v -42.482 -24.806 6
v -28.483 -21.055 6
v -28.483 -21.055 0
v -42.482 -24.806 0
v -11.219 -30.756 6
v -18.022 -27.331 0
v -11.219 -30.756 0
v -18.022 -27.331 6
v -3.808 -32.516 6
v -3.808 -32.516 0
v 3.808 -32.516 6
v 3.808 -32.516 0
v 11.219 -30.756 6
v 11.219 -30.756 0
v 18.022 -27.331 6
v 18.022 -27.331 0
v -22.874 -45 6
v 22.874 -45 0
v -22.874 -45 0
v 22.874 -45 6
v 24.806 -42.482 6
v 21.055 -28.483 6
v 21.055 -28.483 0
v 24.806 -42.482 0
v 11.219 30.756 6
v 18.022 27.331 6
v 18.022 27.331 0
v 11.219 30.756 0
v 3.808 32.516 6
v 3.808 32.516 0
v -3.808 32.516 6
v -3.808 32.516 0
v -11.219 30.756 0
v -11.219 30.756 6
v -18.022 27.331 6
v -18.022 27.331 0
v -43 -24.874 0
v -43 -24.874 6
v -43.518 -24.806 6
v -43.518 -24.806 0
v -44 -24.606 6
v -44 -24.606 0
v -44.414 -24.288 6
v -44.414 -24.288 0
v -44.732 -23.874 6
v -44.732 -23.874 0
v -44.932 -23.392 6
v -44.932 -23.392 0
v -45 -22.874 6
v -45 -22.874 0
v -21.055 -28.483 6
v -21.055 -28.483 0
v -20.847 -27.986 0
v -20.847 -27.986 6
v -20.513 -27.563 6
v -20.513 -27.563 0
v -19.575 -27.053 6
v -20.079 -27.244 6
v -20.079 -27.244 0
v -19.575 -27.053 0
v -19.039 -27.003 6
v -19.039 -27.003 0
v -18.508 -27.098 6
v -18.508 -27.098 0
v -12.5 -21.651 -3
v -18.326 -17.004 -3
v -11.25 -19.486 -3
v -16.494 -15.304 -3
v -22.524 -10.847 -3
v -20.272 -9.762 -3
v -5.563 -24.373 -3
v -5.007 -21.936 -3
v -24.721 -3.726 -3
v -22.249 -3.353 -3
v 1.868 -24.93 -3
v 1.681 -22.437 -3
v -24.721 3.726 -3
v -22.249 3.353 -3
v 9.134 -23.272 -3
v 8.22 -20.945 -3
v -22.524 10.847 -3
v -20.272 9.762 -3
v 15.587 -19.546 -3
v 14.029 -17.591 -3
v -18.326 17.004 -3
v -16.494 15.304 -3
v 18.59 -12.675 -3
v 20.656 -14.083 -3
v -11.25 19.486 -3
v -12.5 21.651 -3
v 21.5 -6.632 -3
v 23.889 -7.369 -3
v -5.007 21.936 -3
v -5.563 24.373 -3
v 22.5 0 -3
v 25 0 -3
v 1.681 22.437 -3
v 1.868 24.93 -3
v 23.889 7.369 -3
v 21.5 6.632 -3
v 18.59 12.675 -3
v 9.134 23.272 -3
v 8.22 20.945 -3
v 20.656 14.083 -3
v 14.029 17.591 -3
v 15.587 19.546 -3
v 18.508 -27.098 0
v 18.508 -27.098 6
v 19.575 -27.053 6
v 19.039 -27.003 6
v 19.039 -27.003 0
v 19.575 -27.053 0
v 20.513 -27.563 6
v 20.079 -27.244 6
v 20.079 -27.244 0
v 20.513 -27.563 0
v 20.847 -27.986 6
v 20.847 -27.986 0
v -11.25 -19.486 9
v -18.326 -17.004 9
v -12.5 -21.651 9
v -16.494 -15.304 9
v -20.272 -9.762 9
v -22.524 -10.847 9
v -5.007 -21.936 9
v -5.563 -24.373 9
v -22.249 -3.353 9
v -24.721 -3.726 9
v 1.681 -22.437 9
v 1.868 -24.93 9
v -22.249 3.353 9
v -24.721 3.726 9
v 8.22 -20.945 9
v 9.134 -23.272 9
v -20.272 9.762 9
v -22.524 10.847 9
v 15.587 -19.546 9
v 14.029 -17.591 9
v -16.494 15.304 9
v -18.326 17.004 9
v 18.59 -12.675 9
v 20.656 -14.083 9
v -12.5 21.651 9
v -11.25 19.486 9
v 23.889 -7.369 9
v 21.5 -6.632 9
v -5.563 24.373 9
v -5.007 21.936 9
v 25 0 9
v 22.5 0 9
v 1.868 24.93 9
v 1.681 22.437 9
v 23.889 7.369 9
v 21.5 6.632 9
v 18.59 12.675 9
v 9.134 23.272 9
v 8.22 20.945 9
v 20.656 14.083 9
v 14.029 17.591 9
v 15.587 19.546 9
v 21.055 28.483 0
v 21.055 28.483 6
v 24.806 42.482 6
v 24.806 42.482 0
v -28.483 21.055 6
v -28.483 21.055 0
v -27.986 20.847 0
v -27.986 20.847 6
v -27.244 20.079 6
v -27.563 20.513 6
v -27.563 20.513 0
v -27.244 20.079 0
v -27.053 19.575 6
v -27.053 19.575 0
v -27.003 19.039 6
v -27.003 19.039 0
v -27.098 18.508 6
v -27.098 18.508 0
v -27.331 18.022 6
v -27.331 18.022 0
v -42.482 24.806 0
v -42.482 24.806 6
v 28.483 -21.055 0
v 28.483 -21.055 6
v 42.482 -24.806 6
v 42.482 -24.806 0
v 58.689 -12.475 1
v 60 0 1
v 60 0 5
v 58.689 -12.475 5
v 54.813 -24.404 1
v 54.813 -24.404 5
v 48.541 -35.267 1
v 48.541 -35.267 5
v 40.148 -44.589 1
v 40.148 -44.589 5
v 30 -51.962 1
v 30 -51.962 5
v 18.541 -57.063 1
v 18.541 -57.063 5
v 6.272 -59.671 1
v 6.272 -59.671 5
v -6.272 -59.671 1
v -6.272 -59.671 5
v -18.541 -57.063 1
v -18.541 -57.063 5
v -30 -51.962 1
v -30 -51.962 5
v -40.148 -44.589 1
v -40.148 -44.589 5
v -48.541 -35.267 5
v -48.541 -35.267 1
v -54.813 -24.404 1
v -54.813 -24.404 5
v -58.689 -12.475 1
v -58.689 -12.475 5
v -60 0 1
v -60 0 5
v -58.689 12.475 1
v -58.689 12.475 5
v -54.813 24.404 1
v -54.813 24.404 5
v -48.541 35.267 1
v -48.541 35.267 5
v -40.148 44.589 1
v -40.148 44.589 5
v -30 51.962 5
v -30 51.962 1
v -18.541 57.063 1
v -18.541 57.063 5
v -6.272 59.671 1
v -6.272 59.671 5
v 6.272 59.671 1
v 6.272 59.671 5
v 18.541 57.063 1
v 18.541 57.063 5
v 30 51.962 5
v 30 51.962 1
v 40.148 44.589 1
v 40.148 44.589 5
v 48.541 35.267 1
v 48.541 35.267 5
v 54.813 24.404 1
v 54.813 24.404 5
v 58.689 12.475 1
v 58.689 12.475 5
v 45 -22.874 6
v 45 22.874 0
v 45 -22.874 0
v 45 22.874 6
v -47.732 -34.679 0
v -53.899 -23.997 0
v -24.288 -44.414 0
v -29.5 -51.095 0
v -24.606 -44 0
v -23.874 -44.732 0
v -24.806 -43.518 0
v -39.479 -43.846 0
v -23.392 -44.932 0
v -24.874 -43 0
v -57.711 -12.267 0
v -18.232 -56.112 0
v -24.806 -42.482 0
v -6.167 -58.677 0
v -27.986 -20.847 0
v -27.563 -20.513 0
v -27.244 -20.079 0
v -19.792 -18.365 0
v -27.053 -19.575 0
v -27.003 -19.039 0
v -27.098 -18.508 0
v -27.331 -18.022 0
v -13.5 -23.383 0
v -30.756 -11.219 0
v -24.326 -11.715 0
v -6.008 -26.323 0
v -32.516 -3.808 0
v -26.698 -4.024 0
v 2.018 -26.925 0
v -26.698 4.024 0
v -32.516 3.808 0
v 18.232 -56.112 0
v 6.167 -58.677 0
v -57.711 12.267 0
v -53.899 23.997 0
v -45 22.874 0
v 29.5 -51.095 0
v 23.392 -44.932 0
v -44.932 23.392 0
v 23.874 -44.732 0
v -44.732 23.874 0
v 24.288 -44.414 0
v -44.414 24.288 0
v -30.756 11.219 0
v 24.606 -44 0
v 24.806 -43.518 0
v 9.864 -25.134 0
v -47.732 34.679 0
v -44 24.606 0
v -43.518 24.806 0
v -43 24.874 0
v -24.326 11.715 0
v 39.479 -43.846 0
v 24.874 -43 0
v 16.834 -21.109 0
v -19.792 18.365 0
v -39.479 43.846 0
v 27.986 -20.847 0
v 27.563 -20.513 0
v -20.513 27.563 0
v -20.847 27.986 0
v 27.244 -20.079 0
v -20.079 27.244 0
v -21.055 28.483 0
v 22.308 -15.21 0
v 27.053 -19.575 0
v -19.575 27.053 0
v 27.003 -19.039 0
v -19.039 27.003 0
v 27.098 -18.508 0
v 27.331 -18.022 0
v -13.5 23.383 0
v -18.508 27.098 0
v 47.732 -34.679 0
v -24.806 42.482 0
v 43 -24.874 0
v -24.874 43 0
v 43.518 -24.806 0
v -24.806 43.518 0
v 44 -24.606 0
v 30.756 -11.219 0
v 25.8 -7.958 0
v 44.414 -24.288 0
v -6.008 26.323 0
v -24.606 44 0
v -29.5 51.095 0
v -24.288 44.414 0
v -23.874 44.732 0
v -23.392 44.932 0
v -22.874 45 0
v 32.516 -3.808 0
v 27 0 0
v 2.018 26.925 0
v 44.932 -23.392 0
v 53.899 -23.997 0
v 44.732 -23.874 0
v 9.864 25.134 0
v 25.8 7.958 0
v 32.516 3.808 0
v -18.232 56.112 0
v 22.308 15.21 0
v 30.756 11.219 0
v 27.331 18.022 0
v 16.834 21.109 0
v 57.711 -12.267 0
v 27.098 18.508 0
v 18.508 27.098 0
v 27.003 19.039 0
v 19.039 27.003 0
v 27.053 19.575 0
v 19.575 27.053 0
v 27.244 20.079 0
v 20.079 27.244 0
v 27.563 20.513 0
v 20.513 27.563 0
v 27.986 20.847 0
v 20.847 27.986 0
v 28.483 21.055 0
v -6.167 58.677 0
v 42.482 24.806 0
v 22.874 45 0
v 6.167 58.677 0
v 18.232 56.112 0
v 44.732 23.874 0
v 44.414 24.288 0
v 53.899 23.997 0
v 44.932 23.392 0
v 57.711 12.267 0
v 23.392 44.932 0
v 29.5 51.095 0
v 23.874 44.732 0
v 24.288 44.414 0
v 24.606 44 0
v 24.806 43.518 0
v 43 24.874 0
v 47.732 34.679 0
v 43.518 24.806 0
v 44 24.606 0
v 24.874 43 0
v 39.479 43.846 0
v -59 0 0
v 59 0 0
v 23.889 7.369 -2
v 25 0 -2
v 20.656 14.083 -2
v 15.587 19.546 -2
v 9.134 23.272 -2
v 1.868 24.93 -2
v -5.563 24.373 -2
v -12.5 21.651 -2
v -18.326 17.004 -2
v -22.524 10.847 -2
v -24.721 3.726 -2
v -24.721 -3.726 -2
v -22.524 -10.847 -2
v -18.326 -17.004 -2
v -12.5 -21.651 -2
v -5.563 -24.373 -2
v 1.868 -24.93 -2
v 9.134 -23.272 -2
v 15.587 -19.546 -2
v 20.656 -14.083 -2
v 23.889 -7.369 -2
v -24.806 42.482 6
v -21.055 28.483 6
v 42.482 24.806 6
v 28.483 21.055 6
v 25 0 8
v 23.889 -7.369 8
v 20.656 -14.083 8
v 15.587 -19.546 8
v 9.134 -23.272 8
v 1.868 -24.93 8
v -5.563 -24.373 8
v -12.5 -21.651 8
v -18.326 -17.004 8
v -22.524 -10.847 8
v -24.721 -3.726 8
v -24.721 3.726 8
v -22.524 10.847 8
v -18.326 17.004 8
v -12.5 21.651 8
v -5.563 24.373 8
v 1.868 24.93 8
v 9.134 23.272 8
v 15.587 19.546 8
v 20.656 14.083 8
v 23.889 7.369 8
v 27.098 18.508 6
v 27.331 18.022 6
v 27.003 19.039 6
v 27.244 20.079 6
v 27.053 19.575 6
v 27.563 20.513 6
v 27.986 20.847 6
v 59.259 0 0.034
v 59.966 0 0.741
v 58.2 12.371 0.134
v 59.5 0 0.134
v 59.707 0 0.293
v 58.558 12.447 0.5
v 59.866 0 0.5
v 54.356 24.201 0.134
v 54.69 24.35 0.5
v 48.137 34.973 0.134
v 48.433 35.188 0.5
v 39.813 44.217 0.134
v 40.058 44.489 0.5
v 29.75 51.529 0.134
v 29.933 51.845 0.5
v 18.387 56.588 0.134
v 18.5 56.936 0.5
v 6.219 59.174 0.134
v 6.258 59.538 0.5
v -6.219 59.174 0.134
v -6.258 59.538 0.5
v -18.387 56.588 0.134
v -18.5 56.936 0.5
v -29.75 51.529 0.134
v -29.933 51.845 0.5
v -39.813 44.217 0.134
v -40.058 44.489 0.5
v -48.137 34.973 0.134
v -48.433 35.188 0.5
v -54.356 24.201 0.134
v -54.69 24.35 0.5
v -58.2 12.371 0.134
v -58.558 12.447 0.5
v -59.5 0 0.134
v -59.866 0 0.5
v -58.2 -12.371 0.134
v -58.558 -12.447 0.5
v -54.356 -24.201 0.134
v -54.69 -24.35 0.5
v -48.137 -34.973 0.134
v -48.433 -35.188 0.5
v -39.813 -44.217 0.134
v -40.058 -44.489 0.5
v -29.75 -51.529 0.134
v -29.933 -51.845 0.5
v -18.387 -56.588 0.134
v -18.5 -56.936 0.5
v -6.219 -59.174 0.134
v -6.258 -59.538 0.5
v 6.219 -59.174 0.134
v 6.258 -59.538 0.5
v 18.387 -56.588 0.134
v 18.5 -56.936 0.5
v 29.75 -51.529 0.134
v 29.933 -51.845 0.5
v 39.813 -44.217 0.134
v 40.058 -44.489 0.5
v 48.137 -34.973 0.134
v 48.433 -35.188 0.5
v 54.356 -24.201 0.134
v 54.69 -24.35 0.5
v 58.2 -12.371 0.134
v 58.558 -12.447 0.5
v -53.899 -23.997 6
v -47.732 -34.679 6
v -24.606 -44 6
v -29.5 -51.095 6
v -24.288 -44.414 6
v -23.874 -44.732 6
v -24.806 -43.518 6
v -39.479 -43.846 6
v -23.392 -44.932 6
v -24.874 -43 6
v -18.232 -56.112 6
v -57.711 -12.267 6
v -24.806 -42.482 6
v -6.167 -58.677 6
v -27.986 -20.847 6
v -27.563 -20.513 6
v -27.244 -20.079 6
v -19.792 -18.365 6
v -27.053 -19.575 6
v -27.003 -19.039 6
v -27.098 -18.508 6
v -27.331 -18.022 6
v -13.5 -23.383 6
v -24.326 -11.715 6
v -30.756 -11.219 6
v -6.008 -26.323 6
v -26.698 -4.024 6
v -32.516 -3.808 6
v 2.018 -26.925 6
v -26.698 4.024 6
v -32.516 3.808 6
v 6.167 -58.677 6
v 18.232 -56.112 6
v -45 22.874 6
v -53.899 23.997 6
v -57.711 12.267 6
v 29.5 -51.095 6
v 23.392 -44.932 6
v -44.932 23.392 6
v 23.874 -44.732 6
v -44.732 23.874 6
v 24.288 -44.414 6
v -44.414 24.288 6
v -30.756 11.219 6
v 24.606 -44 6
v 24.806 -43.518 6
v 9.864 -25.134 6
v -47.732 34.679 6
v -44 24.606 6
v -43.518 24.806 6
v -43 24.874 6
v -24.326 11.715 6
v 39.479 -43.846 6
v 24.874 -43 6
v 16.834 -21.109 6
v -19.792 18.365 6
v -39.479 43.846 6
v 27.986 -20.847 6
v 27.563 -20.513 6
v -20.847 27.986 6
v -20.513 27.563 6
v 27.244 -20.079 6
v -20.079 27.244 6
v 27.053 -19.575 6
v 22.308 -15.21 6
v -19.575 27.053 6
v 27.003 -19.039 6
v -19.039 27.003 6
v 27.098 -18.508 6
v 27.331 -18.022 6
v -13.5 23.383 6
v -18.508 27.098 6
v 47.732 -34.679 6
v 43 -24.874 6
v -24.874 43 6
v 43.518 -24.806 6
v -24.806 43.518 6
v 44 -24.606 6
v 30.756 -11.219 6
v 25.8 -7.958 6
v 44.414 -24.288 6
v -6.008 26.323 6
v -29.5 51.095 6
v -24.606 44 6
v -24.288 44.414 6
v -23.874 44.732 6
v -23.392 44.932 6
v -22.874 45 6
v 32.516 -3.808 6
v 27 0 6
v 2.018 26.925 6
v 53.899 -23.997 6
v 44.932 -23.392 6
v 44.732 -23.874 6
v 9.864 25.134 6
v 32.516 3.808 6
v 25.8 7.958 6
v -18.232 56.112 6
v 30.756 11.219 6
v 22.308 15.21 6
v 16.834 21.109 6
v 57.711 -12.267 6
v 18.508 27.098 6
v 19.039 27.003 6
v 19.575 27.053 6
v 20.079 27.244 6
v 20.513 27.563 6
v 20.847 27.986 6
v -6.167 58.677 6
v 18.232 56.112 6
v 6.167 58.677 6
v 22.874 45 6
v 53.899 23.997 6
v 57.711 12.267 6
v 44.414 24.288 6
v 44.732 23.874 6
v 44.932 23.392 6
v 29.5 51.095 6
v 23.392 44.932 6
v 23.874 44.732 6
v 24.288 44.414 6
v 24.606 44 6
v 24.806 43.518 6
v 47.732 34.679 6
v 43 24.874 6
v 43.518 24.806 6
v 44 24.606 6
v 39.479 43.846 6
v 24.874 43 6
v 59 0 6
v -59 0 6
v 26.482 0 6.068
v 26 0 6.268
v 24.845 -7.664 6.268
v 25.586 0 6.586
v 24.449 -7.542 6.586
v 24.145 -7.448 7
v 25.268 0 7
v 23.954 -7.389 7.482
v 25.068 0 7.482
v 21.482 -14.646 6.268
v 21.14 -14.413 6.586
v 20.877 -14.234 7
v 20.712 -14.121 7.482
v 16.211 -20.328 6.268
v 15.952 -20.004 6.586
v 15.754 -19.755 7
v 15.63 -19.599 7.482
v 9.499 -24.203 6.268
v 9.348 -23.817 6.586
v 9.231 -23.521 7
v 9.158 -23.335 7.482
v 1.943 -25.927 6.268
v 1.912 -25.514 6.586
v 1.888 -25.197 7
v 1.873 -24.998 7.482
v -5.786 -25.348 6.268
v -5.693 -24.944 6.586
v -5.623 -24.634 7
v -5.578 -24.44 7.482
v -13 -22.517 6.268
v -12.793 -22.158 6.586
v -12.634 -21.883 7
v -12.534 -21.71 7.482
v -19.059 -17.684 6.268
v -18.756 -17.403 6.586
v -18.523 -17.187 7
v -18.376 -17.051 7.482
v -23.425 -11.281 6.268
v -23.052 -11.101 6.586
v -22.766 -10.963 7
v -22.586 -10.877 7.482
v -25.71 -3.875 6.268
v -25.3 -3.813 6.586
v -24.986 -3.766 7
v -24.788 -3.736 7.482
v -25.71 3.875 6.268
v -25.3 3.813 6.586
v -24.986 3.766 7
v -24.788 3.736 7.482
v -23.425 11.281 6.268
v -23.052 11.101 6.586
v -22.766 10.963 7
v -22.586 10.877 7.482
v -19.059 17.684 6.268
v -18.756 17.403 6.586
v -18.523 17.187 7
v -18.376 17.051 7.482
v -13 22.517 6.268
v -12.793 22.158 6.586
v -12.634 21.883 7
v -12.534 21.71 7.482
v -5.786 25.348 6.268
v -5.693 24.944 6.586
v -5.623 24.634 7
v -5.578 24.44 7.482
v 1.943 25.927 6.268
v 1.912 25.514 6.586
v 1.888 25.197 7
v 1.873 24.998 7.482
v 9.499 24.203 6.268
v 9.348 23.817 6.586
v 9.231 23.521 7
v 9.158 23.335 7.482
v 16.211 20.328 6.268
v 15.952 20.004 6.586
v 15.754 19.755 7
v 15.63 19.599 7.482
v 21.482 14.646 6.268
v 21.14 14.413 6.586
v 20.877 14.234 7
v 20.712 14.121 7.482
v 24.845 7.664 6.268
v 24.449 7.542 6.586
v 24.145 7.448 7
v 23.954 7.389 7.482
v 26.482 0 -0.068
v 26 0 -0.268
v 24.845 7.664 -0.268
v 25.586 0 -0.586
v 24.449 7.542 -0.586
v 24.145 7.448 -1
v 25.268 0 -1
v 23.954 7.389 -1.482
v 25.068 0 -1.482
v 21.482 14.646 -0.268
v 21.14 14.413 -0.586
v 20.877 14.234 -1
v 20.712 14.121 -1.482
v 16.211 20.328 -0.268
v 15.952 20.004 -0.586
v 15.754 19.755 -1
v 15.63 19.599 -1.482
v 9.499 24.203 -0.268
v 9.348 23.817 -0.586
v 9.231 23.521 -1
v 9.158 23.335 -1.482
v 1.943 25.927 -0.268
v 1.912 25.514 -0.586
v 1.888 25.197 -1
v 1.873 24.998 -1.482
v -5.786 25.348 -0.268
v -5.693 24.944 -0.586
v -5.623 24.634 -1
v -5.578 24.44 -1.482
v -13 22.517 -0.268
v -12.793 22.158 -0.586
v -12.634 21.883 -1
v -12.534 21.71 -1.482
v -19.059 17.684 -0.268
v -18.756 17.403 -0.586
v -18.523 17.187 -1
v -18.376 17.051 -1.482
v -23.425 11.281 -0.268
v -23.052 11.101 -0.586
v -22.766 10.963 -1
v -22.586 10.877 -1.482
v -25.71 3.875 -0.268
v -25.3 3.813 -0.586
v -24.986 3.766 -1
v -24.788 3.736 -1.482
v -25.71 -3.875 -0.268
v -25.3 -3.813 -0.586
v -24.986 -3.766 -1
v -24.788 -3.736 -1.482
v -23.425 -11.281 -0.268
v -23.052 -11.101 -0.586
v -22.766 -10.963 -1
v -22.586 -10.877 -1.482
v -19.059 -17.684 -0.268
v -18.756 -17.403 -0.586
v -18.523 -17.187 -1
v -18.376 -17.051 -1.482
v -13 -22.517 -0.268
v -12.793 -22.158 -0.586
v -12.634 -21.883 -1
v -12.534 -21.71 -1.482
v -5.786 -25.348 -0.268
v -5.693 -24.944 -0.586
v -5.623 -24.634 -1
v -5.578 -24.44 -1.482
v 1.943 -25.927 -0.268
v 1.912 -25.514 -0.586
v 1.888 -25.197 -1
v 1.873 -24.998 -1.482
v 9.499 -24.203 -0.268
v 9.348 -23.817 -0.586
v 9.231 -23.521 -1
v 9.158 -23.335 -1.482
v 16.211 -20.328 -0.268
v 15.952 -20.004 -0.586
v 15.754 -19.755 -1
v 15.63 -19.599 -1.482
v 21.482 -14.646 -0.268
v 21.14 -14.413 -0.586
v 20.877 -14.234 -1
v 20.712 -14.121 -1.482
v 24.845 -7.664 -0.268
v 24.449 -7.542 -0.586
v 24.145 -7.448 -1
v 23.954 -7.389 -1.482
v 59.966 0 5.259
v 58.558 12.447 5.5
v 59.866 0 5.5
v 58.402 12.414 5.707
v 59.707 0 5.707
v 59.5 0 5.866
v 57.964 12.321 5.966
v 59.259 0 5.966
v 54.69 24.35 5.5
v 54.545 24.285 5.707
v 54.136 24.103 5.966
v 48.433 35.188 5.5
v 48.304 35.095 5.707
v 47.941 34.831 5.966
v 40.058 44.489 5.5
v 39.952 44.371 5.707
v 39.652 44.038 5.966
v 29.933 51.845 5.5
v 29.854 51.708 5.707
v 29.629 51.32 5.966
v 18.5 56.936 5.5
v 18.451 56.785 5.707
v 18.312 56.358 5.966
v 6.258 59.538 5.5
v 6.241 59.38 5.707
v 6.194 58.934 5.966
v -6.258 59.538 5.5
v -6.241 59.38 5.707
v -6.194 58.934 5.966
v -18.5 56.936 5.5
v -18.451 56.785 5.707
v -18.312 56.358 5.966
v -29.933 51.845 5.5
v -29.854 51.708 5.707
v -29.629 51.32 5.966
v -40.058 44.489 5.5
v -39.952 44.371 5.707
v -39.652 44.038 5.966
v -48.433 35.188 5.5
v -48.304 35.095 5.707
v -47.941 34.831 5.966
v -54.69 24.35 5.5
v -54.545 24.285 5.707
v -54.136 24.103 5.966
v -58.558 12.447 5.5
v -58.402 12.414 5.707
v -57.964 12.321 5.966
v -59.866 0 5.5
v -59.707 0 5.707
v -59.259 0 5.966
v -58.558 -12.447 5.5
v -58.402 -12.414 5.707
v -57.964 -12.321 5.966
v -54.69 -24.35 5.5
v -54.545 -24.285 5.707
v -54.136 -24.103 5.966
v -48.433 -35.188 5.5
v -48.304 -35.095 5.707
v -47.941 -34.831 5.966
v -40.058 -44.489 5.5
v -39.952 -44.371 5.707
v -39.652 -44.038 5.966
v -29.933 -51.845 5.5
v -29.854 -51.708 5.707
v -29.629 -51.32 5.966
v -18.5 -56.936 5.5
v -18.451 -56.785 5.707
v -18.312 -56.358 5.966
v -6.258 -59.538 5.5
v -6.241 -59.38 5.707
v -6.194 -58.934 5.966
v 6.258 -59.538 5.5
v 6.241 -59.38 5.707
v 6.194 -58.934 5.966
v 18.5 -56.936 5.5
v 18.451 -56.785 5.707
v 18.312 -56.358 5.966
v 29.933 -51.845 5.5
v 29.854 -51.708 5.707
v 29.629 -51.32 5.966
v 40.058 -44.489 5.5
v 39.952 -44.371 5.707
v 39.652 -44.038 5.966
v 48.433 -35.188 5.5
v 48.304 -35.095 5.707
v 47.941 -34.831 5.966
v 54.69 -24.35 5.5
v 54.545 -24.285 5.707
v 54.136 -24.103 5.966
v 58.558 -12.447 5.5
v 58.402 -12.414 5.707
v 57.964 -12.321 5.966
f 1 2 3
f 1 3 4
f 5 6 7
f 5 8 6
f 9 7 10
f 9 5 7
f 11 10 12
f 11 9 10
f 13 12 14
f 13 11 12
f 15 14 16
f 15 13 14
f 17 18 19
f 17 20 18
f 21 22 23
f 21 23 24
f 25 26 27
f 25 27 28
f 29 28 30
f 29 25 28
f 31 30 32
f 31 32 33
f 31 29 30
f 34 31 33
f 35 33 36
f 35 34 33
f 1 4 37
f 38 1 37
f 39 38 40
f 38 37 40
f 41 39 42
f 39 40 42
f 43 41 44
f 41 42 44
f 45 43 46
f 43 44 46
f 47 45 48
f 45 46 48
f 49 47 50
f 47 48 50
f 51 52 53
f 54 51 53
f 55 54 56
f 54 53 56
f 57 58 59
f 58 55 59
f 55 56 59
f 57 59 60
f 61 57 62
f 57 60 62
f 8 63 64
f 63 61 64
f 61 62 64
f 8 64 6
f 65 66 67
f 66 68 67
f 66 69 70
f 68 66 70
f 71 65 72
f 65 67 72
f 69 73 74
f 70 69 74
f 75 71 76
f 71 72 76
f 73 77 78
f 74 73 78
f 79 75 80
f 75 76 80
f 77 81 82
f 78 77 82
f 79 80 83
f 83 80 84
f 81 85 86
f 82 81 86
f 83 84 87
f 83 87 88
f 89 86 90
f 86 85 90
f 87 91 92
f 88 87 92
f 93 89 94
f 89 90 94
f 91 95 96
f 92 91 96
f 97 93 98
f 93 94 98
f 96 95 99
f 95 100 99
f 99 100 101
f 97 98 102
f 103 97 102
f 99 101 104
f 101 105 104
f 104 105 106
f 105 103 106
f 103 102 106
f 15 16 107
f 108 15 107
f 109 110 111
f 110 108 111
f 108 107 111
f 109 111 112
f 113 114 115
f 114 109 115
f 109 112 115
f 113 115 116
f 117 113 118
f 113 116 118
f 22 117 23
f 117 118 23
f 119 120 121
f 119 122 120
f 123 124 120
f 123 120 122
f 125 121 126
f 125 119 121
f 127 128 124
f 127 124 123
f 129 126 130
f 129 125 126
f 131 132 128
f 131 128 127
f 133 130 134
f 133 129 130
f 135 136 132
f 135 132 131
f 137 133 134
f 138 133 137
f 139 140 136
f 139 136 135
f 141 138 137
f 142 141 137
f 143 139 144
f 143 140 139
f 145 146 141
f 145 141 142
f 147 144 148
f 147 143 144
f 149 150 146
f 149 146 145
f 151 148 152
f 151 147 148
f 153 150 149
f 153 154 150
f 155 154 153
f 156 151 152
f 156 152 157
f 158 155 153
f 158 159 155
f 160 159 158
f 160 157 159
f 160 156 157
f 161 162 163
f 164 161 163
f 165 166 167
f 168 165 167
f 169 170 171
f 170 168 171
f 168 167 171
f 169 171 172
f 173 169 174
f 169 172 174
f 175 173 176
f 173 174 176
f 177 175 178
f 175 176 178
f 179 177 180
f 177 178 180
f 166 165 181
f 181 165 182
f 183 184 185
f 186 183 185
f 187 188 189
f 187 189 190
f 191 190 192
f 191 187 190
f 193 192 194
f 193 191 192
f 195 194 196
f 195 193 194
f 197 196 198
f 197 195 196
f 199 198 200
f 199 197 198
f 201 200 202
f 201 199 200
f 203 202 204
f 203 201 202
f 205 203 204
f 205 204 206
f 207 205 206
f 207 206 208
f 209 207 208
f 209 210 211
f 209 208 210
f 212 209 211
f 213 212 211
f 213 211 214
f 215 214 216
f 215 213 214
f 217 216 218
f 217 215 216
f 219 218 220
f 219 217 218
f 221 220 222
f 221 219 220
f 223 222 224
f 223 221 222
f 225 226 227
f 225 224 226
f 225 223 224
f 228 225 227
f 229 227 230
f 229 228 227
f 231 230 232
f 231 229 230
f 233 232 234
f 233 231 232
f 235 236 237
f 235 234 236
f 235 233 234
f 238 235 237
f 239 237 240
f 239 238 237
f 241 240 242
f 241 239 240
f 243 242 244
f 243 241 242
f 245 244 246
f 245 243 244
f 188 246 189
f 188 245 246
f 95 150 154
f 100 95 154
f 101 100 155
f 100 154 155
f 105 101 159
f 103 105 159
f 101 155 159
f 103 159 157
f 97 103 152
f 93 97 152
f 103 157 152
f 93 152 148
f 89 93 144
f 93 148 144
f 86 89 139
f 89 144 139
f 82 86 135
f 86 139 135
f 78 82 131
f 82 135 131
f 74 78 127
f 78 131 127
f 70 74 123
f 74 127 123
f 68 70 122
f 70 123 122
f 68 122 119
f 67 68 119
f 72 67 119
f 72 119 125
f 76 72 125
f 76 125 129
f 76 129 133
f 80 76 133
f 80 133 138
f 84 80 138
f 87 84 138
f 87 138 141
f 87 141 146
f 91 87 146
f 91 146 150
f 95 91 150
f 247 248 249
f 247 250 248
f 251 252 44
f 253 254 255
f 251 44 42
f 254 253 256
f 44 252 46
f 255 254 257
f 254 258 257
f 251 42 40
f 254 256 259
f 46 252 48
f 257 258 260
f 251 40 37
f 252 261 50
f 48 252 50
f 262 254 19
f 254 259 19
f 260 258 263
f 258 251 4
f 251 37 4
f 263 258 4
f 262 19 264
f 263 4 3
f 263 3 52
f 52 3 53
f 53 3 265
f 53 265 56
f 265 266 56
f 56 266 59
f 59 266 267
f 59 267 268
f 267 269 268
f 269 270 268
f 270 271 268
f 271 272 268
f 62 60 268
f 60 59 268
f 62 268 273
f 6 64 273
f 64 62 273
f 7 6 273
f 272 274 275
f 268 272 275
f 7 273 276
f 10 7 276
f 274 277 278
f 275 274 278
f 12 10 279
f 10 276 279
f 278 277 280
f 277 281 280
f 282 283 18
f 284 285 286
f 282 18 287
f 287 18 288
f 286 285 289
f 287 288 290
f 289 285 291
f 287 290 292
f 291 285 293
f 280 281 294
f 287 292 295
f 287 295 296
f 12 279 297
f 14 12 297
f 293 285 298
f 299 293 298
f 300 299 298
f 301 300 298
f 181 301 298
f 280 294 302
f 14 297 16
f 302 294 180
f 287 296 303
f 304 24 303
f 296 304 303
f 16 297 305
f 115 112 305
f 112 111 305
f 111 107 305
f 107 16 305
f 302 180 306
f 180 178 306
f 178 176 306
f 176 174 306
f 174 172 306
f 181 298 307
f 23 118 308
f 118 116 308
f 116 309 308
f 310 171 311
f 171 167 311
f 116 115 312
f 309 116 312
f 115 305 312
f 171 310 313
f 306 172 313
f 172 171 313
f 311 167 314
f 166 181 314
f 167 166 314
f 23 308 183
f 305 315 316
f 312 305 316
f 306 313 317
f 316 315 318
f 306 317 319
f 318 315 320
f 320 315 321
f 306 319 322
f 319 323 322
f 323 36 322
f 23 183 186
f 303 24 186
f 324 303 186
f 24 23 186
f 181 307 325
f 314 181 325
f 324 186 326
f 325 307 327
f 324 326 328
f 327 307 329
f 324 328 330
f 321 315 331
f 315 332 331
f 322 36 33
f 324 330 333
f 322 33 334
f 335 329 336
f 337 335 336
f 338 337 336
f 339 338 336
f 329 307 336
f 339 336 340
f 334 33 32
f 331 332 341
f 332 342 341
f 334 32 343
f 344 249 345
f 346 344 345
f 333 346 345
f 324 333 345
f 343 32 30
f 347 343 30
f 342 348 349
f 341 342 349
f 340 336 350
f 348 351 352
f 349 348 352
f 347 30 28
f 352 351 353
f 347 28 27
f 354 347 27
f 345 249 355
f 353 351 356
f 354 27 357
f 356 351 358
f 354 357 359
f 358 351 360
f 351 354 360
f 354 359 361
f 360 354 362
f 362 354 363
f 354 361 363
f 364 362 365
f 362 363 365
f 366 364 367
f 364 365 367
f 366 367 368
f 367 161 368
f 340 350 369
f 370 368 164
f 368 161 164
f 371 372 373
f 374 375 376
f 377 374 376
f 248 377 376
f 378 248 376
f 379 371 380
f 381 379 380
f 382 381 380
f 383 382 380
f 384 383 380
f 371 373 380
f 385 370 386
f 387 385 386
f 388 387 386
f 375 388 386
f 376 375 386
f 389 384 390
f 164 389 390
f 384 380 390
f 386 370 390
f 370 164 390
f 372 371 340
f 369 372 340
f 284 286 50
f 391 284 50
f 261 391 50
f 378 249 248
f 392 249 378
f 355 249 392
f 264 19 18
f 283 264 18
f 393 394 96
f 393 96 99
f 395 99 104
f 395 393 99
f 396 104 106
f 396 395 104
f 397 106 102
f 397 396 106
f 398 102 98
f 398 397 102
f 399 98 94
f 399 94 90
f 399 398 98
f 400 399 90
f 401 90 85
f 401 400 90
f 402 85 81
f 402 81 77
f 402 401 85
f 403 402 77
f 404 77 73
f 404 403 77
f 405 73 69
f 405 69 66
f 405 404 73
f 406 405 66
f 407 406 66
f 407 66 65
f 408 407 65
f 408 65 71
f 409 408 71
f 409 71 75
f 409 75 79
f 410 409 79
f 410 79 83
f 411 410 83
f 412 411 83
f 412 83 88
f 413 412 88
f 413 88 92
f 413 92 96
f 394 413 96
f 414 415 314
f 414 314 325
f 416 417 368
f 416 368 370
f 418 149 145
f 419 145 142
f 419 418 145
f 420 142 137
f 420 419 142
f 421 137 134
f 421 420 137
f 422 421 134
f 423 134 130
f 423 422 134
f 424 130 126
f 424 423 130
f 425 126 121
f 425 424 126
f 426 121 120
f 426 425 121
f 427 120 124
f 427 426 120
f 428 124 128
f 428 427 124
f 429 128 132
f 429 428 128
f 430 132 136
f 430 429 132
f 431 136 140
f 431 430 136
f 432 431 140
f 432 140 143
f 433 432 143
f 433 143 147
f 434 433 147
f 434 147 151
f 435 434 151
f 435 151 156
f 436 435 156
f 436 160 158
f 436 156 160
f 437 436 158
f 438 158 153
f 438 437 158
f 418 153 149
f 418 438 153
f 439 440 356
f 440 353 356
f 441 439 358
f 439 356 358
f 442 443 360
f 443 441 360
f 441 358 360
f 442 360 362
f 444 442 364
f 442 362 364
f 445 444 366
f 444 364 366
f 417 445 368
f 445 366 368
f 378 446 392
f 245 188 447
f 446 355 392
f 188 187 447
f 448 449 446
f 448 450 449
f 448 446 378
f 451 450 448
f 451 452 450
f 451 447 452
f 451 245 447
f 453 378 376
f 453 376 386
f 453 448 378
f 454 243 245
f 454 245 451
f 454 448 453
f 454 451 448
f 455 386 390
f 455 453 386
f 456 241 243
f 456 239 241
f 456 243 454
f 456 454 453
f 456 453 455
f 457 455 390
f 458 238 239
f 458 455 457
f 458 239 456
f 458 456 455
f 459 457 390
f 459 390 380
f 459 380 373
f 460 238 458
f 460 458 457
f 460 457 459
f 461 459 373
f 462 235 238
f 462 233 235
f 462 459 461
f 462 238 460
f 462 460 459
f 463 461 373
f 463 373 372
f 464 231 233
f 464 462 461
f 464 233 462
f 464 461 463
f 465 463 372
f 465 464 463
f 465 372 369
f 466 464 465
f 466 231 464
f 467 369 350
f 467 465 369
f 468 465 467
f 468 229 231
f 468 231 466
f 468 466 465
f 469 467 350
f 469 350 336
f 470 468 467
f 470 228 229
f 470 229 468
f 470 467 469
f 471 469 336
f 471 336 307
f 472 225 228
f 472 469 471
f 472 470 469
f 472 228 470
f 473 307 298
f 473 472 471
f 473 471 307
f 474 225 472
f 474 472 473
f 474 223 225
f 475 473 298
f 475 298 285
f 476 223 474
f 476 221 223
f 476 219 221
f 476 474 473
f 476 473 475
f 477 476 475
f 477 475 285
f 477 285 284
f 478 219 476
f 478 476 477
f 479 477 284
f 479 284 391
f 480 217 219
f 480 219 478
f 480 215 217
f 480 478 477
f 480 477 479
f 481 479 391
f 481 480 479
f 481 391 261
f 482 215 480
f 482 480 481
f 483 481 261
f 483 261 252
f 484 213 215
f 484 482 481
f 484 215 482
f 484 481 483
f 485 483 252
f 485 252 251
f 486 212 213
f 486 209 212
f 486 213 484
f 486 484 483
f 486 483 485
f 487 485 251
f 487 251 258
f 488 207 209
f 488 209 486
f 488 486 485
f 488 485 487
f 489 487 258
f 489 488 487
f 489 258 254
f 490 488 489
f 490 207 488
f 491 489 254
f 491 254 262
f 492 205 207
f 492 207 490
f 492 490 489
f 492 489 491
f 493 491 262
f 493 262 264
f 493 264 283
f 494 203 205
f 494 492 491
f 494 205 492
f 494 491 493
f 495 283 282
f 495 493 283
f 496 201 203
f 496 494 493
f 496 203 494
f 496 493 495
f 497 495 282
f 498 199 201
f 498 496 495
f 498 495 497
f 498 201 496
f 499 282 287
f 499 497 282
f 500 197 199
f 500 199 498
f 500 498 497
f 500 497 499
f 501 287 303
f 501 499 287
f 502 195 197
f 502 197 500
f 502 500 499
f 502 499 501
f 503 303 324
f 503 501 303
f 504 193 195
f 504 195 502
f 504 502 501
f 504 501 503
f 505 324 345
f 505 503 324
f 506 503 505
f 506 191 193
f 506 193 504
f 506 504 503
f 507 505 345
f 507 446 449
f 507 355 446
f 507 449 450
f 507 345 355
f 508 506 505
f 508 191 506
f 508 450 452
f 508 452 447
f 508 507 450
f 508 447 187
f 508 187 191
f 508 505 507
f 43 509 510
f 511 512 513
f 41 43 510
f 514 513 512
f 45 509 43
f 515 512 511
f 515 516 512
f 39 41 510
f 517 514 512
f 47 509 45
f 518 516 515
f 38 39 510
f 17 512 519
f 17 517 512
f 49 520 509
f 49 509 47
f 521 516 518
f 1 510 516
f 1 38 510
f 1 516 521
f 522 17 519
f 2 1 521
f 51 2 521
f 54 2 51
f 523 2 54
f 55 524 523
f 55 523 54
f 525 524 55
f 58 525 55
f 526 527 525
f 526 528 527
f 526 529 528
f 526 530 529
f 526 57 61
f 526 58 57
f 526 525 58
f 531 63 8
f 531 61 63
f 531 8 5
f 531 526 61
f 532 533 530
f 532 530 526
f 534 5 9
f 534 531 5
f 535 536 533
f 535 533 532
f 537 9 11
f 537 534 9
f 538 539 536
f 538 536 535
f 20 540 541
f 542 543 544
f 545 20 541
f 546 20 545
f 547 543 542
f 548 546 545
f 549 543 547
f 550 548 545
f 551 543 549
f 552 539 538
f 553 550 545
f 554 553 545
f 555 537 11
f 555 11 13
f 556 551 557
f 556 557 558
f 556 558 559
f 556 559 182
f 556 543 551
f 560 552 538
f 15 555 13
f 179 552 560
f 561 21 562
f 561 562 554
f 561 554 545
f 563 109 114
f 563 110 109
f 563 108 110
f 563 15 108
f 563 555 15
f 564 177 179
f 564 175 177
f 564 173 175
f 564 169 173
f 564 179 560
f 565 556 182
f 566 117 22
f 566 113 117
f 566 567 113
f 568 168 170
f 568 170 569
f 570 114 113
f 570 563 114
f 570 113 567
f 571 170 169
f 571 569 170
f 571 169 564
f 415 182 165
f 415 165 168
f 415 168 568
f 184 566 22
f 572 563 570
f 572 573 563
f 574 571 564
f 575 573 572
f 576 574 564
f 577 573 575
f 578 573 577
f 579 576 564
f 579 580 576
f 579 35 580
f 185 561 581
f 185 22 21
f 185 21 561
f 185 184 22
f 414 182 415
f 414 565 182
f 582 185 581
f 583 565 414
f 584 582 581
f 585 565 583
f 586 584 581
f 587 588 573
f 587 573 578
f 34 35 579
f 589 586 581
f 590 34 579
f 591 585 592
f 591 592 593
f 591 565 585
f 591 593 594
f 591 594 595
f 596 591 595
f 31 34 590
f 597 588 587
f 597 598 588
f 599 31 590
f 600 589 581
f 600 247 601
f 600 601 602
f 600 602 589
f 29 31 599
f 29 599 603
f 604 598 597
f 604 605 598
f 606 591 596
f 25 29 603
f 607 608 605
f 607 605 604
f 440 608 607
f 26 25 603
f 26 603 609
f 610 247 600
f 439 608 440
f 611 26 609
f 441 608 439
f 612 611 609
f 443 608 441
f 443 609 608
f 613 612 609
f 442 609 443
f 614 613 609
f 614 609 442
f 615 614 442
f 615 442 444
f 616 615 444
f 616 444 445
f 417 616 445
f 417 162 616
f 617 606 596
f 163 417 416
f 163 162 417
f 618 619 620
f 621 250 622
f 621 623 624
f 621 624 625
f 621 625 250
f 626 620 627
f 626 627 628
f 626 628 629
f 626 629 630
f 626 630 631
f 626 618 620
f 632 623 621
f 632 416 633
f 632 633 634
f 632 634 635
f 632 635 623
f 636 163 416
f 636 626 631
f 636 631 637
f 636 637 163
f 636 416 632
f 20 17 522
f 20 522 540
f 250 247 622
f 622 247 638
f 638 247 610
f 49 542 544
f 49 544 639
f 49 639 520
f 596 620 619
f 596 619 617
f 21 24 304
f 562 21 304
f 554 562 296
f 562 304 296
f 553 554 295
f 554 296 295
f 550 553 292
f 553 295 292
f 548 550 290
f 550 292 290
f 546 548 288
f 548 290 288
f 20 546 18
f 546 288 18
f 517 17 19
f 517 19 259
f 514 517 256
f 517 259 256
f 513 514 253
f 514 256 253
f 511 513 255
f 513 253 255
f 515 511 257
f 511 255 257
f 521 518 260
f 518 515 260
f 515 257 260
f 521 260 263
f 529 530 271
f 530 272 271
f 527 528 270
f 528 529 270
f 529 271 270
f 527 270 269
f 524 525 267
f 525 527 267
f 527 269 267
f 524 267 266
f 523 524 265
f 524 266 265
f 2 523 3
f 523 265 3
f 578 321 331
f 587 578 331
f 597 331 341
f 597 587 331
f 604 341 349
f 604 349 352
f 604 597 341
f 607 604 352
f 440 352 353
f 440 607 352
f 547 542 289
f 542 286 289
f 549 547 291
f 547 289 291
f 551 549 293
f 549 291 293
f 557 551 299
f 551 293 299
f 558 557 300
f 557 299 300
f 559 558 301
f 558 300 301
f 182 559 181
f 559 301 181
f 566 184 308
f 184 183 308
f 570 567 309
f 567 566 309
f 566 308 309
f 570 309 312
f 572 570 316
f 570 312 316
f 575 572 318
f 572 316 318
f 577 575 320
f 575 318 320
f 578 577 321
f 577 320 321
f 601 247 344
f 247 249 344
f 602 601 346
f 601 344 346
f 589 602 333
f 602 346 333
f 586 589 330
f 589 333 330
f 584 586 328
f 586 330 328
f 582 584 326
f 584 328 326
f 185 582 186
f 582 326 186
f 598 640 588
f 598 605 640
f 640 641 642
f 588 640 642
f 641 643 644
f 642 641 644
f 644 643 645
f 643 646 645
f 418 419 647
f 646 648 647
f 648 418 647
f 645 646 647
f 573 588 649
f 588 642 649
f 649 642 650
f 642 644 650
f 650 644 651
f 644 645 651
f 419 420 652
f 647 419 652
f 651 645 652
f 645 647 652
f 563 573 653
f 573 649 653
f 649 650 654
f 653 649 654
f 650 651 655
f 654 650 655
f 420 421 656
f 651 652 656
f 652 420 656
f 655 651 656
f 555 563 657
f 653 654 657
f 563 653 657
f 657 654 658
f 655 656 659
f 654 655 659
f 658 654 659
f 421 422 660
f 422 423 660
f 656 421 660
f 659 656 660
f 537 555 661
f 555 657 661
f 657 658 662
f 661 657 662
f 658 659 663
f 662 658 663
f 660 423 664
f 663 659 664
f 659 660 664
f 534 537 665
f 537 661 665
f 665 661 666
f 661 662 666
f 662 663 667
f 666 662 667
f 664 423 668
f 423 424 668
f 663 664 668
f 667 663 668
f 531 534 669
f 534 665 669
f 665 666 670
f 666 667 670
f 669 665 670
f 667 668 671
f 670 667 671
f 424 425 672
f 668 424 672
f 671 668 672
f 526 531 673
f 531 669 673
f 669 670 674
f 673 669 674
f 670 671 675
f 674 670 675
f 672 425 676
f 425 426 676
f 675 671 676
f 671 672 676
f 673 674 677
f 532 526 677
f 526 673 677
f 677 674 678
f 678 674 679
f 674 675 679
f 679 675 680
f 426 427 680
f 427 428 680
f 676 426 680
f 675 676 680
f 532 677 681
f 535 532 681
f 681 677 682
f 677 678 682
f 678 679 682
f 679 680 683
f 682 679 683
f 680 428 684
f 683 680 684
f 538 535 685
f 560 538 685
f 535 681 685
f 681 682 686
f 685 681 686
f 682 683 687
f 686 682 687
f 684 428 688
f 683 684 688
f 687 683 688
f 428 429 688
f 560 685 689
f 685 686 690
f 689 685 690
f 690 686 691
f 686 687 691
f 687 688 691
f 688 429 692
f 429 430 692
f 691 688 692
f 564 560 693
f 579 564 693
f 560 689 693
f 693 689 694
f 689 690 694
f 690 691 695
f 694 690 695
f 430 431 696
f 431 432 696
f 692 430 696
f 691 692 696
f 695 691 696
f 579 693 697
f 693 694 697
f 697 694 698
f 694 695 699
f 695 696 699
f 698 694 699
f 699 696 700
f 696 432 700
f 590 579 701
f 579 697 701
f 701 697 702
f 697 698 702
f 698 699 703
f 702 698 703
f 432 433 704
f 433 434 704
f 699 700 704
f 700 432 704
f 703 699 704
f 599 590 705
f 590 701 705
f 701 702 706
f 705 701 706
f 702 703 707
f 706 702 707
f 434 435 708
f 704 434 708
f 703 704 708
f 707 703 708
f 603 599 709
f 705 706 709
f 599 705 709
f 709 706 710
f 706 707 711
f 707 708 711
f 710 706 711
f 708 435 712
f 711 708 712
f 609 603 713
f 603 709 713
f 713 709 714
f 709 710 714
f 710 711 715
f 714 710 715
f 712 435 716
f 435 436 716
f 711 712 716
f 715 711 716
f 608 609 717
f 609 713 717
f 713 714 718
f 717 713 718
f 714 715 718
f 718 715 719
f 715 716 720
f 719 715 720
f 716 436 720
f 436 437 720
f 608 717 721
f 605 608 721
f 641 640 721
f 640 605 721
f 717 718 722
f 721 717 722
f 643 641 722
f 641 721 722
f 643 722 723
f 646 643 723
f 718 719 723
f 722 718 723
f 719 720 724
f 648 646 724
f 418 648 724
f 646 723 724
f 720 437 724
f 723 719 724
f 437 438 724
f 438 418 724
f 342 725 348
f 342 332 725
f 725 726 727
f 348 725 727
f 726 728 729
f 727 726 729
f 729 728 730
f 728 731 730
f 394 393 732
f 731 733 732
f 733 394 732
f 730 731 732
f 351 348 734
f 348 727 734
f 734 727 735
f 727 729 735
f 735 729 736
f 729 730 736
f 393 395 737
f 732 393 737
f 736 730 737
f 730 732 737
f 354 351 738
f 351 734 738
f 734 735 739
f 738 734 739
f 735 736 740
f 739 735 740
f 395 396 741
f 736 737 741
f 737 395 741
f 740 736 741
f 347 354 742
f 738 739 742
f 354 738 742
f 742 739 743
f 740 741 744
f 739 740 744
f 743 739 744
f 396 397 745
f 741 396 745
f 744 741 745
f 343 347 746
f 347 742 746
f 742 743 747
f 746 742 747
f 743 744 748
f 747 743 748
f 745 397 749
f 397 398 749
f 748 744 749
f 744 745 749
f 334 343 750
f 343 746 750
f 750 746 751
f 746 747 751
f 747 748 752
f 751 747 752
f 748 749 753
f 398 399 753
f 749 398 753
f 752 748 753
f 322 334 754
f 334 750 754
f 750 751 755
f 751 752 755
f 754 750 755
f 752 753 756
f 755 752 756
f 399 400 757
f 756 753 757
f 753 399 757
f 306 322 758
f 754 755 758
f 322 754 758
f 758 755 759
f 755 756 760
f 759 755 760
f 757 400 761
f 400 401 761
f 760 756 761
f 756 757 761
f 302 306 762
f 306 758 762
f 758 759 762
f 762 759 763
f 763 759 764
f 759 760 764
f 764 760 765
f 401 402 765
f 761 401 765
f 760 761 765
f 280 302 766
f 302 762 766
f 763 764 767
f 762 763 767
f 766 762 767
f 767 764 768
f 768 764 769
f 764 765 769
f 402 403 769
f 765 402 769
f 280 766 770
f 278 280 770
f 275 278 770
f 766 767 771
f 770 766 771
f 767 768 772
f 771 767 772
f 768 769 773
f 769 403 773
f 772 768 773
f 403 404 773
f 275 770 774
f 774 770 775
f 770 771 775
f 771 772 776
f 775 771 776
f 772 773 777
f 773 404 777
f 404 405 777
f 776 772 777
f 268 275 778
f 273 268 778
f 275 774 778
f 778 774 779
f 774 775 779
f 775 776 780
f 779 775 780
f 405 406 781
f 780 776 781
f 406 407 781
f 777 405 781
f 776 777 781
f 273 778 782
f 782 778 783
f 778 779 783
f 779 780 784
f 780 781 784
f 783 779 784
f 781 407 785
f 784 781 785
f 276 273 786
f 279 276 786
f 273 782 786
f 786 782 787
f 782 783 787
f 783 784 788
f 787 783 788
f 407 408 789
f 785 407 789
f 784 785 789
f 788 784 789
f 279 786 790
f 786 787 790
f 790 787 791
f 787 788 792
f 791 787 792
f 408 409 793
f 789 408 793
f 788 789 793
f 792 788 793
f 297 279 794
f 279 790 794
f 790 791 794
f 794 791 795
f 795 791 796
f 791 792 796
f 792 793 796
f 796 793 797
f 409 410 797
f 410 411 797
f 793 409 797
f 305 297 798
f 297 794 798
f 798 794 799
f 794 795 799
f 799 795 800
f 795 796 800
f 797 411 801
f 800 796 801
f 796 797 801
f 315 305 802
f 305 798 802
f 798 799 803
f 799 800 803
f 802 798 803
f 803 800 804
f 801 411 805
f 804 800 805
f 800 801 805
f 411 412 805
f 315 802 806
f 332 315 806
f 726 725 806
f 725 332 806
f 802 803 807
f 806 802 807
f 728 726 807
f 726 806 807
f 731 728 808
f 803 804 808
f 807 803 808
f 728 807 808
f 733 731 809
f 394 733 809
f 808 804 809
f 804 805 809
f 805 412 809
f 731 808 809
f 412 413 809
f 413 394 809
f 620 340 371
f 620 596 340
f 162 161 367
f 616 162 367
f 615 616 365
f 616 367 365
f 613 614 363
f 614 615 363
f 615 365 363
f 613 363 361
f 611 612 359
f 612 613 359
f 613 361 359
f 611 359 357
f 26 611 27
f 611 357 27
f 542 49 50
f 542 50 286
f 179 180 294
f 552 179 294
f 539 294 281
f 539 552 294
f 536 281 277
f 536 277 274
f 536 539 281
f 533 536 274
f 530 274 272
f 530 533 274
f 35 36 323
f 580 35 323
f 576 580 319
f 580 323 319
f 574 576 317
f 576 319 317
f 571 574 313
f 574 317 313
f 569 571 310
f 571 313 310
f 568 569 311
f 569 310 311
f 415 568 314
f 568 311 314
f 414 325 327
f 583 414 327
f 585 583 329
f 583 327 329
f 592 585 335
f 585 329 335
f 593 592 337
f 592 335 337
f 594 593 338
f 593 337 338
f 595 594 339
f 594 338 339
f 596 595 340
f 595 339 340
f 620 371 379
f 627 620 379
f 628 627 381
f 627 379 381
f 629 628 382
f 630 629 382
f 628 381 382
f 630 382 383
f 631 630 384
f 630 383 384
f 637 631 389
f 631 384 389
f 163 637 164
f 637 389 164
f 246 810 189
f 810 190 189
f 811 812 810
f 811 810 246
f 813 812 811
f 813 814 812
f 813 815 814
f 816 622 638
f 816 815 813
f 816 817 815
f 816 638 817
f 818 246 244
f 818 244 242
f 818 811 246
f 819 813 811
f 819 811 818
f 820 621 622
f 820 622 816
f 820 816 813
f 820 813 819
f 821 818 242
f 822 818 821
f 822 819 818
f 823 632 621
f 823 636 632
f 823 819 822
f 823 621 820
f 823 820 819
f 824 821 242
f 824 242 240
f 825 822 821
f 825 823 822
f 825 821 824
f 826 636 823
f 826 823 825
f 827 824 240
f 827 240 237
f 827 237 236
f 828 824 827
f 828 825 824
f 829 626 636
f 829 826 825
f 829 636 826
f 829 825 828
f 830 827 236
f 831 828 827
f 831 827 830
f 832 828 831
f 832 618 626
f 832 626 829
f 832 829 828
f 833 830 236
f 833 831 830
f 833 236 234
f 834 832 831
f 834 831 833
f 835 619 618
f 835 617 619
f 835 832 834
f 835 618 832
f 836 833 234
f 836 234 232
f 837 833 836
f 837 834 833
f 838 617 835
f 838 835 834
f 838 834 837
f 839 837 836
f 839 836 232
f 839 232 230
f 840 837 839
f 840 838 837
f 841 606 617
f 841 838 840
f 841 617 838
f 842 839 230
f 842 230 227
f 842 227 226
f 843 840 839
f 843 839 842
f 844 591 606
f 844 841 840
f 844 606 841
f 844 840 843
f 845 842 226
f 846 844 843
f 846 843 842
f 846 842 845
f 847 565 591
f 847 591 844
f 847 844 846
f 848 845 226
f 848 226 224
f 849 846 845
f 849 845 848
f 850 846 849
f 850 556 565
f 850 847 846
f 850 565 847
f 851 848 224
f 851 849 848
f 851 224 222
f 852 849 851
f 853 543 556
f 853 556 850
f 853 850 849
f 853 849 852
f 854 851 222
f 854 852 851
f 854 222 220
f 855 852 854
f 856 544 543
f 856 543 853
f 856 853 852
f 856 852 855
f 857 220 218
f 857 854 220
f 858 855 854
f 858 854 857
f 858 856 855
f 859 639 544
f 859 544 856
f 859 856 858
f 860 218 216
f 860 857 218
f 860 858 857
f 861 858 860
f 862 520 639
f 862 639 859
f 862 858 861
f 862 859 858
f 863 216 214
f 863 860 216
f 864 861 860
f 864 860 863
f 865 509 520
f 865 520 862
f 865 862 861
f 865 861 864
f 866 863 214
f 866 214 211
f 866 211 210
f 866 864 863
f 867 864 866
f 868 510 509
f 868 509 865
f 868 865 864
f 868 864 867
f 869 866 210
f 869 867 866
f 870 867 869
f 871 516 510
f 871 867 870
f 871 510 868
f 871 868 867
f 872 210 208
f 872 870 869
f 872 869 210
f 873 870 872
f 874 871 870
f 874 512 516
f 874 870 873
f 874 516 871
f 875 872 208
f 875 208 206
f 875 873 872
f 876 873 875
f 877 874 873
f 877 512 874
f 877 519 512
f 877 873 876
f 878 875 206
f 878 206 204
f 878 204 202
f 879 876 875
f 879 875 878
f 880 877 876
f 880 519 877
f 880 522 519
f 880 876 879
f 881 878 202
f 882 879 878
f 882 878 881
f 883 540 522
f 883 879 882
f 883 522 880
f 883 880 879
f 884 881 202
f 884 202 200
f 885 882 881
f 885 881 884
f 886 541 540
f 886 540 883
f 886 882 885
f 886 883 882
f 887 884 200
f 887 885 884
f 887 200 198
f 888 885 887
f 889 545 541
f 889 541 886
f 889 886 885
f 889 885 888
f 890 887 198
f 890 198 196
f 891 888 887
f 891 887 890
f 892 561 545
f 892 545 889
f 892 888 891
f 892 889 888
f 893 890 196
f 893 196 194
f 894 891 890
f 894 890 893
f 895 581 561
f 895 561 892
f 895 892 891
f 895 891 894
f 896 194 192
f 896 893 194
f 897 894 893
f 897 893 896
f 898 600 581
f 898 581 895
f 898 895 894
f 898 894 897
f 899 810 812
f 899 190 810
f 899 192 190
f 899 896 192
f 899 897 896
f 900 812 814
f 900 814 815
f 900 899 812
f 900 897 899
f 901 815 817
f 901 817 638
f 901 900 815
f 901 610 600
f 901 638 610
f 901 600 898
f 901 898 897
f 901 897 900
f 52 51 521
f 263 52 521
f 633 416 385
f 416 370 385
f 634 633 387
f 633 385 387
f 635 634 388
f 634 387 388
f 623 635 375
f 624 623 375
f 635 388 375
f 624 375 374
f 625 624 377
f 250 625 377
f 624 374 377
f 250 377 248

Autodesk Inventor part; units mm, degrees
ref_plane "YZ Plane" through (0, 0, 0) normal (1, 0, 0) x (0, 1, 0)
ref_plane "XZ Plane" through (0, 0, 0) normal (0, 1, 0) x (-1, 0, 0)
sketch "Skizze1" plane through (0, 0, 0) normal (0, 0, 1) x (1, 0, 0)
  circle A0 centre (0, 0) radius 60
  dimension "d0" = 120
extrude "Extrusion1" add sketch "Skizze1" along normal blind 6
ref_plane "Arbeitsebene1" through (0, 0, 3) normal (0, 0, 1) x (1, 0, 0)
sketch "Skizze3" plane through (0, 0, 3) normal (0, 0, 1) x (1, 0, 0)
  circle A0 centre (0, 0) radius 25
  dimension "d5" = 50
extrude "Extrusion2" add sketch "Skizze3" along normal mid plane 12
sketch "Skizze4" plane through (0, 0, 9) normal (0, 0, 1) x (1, 0, 0)
  circle A0 centre (0, 0) radius 22.5
  dimension "d8" = 45
extrude "Extrusion3" cut sketch "Skizze4" against normal blind 12
fillet "Rundung1" radius 2 1 edges at (-25, 0, 6)
fillet "Rundung2" radius 2 1 edges at (-25, 0, 0)
sketch "Skizze5" plane through (0, 0, 6) normal (0, 0, 1) x (1, 0, 0)
  line L0 (25.4807, -45) -> (-25.4807, -45)
  arc A0 (-20.3044, -25.6815) -> (20.3044, -25.6815) centre (0, 0) ccw
  circle A1 centre (0, 0) radius 27 projected
  line L1 (20.3044, -25.6815) -> (25.4807, -45)
  line L2 (-20.3044, -25.6815) -> (-25.4807, -45)
  line L3 (0, 0) -> (0, -59.7048) construction
  circle A2 centre (0, 0) radius 22.5 projected
  dimension "d16" = 20
  dimension "d17" = 45
  dimension "d18" = 75
extrude "Extrusion4" cut sketch "Skizze5" against normal blind 12 contours L0 L2 A0 L1
fillet "Rundung3" radius 2 2 edges at (-25.4807, -45, 3) (25.4807, -45, 3)
fillet "Rundung4" radius 2 2 edges at (-20.3044, -25.6815, 3) (20.3044, -25.6815, 3)
pattern_circular "Runde Anordnung1" count 4 over 360 about axis through (0, 0, 0) along (0, 0, 1) of "Extrusion4", "Rundung4", "Rundung3"
fillet "Rundung5" radius 1 2 edges at (-60, 0, 0) (-60, 0, 6)
properties part number "practice6" material "Stahl, galvanisiert"
